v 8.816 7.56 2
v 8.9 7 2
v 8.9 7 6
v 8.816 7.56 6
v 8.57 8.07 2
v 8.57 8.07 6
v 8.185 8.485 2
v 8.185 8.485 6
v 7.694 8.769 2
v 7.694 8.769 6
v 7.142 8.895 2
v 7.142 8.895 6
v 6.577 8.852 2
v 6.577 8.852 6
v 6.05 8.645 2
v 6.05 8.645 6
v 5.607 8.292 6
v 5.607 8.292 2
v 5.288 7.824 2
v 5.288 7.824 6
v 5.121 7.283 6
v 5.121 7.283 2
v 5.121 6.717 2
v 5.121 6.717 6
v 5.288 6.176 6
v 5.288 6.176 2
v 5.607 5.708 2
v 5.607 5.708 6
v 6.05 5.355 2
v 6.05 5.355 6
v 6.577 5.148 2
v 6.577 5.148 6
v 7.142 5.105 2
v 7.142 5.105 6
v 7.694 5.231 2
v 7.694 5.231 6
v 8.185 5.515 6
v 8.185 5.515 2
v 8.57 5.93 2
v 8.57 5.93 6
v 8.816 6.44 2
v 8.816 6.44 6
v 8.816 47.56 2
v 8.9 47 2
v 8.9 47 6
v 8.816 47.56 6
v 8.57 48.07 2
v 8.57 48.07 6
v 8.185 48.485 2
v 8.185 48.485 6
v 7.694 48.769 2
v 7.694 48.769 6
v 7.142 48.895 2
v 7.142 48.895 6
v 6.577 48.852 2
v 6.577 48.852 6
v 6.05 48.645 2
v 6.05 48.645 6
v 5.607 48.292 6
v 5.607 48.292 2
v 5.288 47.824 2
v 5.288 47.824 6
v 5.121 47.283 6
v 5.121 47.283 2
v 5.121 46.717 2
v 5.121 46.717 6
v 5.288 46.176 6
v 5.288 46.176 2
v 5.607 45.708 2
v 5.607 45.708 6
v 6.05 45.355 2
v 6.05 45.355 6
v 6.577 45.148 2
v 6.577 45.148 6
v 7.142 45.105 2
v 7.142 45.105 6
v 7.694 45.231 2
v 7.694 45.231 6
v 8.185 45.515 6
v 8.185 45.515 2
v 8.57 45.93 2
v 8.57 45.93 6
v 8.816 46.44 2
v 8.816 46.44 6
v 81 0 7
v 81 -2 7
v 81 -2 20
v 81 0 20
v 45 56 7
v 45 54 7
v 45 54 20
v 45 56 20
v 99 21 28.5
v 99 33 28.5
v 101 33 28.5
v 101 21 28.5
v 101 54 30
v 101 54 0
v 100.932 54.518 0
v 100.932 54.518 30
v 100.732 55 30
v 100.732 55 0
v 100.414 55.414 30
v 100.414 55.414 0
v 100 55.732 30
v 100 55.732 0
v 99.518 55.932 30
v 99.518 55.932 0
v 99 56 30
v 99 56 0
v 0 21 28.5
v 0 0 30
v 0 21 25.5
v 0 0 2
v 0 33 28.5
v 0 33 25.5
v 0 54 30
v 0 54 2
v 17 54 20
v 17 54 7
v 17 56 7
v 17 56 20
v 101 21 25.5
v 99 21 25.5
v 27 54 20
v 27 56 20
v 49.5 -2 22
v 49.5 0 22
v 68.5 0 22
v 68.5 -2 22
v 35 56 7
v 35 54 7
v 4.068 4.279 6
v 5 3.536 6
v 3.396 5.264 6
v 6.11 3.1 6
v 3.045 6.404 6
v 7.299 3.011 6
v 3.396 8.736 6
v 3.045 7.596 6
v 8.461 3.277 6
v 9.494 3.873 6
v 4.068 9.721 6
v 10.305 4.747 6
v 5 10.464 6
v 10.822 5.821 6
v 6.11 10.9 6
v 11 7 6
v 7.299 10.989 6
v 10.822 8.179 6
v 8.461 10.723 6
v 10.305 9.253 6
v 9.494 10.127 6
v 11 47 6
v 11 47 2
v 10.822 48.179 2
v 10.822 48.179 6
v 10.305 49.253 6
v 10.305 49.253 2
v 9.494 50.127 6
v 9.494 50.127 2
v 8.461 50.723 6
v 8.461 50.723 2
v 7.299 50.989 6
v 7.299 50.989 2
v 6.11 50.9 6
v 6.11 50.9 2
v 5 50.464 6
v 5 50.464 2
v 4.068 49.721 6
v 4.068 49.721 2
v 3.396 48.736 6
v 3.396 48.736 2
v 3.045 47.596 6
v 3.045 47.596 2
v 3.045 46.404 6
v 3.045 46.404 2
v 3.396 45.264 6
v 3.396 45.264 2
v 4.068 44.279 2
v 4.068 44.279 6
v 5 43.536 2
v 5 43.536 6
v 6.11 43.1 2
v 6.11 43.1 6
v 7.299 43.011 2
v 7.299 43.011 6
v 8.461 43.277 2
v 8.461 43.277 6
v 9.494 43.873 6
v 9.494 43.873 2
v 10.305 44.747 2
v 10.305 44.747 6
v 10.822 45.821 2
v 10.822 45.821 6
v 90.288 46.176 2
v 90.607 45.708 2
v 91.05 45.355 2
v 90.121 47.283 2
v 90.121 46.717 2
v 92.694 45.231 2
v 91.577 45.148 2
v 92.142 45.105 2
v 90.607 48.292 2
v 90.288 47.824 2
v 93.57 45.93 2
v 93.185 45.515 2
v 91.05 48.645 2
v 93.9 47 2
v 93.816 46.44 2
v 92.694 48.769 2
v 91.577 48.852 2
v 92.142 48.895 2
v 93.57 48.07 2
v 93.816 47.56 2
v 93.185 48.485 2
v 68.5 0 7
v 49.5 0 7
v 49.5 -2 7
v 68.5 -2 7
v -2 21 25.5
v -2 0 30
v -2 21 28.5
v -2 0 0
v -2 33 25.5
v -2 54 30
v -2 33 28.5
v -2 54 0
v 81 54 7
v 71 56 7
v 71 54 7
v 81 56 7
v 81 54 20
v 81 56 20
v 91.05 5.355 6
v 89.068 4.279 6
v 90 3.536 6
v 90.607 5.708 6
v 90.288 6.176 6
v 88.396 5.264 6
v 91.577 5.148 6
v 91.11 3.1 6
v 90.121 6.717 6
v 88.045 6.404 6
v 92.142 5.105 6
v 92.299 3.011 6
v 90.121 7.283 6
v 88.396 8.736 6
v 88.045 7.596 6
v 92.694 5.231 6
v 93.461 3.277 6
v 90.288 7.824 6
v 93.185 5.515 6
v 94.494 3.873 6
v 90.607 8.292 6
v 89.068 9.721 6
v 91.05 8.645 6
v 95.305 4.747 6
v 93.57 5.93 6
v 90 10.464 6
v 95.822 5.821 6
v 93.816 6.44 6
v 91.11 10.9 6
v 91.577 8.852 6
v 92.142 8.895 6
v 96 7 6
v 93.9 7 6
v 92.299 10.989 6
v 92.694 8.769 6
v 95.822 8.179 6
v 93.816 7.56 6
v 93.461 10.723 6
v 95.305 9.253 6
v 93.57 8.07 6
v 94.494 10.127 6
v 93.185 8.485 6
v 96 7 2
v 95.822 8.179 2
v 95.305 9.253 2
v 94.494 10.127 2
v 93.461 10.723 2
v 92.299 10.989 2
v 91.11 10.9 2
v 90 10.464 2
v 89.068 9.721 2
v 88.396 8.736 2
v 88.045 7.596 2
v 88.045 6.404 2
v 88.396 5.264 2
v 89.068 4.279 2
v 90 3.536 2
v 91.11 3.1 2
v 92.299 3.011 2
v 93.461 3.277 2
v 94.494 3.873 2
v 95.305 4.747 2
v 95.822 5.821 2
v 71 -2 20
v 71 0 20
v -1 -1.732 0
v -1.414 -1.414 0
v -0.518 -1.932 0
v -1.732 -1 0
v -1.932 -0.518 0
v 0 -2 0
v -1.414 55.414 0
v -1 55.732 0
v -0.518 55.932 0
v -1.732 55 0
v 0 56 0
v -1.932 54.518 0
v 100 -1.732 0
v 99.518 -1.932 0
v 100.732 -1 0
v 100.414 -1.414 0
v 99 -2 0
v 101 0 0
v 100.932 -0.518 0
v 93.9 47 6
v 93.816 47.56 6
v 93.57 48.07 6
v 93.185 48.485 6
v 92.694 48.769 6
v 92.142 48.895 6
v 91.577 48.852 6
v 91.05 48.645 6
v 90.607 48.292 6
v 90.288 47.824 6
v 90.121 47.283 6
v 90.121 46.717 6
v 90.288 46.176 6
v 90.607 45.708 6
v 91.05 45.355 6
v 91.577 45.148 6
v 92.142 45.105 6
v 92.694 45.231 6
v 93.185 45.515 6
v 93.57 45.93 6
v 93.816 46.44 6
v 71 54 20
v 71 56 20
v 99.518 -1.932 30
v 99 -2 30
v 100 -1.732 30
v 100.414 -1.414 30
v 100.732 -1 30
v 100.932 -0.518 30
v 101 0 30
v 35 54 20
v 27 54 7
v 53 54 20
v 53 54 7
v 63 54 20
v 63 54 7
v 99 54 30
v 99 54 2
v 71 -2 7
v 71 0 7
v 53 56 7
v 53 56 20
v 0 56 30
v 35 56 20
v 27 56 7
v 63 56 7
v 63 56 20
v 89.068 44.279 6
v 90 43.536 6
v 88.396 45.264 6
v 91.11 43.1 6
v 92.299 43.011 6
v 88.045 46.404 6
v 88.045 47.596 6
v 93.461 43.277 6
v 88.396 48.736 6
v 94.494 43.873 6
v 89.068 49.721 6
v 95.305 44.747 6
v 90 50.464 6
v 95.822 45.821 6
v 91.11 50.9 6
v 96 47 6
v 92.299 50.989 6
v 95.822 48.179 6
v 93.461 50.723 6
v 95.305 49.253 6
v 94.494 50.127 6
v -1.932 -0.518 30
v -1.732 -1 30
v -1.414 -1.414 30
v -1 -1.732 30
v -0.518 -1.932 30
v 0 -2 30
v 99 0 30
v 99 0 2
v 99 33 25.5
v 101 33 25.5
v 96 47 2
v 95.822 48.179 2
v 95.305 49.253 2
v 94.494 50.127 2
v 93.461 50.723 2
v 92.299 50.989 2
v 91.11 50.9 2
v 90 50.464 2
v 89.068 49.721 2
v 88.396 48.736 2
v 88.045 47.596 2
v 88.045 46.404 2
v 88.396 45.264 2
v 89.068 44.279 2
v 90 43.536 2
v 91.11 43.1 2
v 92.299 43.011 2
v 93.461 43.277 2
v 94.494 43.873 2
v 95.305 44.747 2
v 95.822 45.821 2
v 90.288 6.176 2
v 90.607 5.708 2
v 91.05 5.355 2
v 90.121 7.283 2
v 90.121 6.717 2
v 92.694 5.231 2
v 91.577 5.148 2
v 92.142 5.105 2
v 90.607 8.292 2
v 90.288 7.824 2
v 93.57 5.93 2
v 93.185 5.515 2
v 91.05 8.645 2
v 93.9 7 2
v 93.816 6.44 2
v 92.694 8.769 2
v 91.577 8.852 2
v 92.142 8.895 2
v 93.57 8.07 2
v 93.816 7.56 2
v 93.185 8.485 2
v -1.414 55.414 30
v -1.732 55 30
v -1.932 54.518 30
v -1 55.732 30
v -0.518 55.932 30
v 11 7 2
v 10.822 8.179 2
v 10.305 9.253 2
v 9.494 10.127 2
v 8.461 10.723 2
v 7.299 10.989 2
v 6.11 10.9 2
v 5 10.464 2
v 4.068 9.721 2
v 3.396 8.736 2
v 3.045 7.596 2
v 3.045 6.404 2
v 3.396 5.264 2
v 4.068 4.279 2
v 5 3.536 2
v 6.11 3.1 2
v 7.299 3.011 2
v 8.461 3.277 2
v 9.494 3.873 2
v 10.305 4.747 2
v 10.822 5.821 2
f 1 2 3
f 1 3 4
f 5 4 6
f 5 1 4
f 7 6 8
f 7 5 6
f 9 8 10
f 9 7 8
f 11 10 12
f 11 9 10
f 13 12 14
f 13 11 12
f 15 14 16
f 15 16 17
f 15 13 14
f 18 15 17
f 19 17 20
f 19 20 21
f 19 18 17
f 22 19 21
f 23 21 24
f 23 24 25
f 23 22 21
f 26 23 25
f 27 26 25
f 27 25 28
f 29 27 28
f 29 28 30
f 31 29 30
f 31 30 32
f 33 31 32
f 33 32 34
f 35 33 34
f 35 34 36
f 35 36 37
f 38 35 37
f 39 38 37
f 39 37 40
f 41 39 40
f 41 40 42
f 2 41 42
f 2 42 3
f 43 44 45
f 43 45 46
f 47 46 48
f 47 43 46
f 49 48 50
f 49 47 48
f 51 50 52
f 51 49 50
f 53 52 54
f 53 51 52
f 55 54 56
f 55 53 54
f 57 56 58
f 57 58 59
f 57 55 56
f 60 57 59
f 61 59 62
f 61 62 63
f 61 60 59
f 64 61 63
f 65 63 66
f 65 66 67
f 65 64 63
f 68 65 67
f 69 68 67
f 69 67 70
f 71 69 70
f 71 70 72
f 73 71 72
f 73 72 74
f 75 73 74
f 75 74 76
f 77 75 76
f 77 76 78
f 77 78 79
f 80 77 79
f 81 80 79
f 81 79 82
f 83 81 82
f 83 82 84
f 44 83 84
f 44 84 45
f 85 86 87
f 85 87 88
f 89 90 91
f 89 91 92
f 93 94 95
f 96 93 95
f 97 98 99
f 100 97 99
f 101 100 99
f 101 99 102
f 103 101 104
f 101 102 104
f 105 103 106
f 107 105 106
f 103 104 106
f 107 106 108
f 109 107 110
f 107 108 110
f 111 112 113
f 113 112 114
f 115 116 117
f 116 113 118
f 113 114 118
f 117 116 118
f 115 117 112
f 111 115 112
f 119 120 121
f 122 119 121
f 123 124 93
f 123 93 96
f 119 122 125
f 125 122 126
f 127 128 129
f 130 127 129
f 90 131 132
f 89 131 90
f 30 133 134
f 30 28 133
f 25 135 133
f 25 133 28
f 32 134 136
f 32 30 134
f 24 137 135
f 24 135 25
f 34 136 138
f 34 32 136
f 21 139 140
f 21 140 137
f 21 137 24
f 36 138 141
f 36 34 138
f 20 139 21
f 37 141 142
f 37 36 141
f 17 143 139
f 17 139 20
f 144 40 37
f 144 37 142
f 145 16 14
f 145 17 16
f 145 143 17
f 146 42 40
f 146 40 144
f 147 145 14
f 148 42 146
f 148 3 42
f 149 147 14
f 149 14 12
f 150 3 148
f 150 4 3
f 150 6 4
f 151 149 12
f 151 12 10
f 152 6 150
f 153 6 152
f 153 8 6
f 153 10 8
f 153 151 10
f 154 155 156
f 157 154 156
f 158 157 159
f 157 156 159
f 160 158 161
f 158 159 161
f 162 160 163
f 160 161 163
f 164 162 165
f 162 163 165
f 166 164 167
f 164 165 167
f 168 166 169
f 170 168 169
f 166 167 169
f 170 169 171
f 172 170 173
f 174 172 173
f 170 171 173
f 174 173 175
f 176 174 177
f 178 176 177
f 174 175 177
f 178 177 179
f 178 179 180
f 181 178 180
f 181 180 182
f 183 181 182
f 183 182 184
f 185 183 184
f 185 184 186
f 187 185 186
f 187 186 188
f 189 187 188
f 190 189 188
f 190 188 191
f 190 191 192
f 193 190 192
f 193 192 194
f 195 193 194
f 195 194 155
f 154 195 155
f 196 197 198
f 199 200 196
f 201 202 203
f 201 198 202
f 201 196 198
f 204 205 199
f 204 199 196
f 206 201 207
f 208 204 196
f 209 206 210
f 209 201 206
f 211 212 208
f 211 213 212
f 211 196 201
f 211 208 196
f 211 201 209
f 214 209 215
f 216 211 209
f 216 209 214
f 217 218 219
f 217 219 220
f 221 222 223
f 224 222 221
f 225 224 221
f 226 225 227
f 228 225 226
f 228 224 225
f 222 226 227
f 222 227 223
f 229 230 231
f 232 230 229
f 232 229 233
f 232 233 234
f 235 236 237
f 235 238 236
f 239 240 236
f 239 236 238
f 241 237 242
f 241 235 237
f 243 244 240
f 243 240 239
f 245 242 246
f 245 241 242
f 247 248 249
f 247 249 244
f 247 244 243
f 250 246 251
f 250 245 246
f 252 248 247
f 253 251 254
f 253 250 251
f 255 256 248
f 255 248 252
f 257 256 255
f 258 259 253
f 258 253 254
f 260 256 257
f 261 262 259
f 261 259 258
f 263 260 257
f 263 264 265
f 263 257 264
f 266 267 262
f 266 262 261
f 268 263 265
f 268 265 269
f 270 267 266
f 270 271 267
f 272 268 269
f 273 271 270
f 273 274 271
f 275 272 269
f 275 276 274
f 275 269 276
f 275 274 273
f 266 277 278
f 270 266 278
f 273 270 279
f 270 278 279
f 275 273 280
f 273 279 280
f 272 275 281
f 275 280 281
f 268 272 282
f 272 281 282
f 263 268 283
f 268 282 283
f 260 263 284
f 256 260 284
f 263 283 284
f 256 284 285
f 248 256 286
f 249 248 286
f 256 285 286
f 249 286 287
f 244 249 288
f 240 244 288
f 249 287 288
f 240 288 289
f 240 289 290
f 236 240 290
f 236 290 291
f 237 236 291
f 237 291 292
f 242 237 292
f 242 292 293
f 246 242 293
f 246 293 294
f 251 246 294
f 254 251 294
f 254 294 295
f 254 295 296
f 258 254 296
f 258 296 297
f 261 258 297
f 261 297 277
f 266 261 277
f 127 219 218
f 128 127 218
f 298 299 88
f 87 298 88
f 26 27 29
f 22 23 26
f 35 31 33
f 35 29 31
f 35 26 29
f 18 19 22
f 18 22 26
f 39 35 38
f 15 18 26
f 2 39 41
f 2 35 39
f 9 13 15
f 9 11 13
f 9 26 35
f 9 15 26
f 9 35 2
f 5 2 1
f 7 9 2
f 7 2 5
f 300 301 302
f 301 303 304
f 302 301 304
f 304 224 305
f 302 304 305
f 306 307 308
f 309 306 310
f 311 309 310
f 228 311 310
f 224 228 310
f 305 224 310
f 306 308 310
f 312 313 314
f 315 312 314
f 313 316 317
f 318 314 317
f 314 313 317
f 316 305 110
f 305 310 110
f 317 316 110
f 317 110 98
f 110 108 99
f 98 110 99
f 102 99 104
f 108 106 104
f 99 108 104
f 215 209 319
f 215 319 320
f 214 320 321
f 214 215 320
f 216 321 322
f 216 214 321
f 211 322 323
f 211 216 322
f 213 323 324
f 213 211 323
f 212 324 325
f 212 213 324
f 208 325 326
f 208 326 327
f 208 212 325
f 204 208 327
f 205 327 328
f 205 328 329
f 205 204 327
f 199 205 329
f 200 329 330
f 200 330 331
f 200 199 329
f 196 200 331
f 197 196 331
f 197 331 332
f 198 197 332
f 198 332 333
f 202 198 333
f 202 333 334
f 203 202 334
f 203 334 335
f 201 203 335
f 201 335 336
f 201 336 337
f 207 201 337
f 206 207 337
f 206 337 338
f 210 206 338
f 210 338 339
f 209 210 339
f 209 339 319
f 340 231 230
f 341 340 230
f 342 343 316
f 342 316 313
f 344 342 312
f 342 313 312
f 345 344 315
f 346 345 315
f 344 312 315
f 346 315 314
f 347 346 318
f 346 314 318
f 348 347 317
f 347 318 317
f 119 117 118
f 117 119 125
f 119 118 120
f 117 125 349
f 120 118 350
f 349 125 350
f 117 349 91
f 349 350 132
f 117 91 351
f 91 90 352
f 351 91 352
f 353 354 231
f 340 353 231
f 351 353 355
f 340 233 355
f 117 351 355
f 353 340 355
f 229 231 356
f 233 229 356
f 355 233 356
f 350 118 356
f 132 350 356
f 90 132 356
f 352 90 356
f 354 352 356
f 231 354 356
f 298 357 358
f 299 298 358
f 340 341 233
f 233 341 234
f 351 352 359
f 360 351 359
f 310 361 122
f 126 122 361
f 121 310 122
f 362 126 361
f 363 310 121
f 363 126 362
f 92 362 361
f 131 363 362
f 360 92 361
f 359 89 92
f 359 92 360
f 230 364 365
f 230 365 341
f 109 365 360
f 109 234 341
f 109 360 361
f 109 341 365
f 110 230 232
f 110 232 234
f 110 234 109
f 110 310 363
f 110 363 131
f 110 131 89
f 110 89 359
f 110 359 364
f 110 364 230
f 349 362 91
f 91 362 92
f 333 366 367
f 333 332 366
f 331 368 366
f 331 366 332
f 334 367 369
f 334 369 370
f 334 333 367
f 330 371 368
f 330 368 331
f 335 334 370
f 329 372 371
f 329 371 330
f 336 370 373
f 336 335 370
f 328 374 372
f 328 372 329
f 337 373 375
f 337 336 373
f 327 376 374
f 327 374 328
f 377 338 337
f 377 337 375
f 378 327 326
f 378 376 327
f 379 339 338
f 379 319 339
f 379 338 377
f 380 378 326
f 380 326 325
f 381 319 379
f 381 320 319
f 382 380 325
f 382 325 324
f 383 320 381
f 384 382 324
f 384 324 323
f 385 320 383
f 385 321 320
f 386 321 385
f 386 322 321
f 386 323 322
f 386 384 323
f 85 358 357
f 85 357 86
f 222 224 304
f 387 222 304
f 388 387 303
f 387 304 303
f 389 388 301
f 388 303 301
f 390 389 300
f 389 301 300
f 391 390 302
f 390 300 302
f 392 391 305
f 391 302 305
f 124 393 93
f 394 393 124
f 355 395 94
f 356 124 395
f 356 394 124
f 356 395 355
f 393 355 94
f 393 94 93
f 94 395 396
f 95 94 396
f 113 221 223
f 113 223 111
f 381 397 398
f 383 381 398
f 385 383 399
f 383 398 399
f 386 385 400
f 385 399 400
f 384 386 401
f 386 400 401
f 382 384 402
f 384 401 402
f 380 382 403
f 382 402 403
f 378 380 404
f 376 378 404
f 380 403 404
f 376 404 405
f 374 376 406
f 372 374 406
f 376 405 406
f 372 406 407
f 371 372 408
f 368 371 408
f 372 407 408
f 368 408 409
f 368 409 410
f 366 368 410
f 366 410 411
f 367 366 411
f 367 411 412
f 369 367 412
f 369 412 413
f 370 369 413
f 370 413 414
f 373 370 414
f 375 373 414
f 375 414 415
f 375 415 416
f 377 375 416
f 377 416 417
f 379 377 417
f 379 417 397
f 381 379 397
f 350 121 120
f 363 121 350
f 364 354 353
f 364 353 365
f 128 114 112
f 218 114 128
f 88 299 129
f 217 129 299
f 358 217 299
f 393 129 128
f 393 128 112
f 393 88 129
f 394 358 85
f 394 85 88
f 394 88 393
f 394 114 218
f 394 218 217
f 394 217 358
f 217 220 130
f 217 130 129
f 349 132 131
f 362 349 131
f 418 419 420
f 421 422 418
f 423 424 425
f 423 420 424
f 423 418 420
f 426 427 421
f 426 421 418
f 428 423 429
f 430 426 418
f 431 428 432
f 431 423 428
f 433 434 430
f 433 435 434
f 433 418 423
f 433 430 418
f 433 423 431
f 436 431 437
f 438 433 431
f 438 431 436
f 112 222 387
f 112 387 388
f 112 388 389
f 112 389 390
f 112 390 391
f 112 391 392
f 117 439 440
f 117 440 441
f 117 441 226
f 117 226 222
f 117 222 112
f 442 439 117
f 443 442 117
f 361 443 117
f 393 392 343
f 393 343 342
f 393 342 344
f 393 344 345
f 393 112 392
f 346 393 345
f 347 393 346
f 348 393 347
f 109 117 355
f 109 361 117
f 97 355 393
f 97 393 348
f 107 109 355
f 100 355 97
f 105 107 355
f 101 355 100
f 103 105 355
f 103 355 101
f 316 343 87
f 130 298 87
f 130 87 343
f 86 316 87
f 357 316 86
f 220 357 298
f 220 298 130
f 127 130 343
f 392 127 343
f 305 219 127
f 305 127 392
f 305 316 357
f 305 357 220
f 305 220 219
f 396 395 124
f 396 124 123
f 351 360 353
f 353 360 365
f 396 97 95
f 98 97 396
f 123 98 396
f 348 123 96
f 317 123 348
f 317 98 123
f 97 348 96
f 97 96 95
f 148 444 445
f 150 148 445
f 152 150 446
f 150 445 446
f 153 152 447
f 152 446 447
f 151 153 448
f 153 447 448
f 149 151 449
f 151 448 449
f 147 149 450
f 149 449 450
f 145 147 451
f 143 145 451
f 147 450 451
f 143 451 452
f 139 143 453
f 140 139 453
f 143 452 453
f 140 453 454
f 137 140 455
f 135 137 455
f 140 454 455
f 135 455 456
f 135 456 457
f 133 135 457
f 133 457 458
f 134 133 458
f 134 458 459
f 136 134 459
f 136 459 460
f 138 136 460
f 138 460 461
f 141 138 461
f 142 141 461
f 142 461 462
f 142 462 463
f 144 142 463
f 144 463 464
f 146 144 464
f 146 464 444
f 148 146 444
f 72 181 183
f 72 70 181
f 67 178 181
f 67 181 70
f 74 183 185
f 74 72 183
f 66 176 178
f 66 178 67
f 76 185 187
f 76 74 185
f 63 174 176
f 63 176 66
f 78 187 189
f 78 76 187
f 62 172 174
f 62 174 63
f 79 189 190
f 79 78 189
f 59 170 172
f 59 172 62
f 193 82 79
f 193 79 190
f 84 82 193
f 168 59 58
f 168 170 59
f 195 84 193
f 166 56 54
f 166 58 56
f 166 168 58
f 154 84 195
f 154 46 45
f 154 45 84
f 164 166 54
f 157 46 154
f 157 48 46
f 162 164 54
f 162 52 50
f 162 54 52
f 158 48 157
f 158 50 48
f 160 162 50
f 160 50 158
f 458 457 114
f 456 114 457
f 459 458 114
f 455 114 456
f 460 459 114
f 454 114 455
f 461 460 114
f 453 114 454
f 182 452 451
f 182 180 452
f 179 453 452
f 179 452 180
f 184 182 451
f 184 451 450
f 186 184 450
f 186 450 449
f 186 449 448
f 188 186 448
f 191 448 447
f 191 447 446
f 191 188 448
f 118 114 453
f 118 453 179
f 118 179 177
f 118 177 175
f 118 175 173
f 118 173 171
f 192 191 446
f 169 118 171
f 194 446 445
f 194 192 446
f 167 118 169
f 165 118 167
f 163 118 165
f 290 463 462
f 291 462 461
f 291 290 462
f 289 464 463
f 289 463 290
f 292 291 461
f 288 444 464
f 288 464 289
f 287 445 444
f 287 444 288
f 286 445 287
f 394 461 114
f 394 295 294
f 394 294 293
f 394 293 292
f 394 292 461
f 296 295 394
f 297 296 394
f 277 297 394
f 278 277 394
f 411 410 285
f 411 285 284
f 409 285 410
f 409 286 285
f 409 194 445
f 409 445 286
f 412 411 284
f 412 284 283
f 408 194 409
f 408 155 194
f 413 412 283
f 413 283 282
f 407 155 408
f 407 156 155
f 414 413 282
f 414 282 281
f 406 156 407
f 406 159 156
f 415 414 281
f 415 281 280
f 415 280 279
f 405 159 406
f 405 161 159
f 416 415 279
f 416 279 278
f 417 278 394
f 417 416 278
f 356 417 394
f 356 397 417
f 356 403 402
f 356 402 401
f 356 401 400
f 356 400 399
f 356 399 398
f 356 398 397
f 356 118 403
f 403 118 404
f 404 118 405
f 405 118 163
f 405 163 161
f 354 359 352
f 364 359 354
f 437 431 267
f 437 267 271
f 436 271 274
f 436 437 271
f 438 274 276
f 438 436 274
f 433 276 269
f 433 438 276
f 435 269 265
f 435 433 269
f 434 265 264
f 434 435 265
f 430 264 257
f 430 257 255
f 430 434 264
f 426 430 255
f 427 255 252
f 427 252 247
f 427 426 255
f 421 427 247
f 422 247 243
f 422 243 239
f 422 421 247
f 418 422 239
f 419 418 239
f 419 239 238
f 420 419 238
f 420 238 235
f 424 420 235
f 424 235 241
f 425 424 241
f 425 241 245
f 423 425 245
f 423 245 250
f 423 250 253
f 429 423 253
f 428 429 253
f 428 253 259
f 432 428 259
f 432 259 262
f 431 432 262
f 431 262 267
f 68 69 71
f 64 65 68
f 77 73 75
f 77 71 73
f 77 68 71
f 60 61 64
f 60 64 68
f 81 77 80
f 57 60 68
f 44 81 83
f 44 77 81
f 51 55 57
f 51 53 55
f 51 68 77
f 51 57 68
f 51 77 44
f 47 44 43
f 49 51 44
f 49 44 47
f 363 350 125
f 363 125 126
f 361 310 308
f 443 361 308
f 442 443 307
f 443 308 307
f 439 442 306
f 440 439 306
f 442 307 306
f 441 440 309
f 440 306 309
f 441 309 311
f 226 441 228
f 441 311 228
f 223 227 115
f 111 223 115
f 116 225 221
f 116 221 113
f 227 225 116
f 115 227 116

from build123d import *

# Parameters (mm, degrees)
BOX002_W      = 10
BOX002_H      = 4
BOX002_DEPTH  = 13
BOX003_W      = 10
BOX003_H      = 4
BOX003_DEPTH  = 13
BOX004_W      = 10
BOX004_H      = 4
BOX004_DEPTH  = 13
BOX005_W      = 10
BOX005_H      = 4
BOX005_DEPTH  = 13
BOX006_W      = 19
BOX006_H      = 4
BOX006_DEPTH  = 15
BOX007_W      = 4
BOX007_H      = 12
BOX007_DEPTH  = 3
BOX008_W      = 4
BOX008_H      = 12
BOX008_DEPTH  = 3
BOX001_W      = 10
BOX001_H      = 4
BOX001_DEPTH  = 13
BOX_W         = 100
BOX_H         = 55
BOX_DEPTH     = 2
TUBE_R        = 4
TUBE_R_2      = 1.9
TUBE_DEPTH    = 6
TUBE001_R     = 4
TUBE001_R_2   = 1.9
TUBE001_DEPTH = 6
TUBE002_R     = 4
TUBE002_R_2   = 1.9
TUBE002_DEPTH = 6
TUBE003_R     = 4
TUBE003_R_2   = 1.9
TUBE003_DEPTH = 6
SKETCH_W      = 99
SKETCH_H      = 54
PAD_DEPTH     = 30


with BuildPart() as barrelcutout001:
    # Box002 → Box002 (new body)
    with BuildSketch(Plane(origin=(53, 52, 7), x_dir=(1, 0, 0), z_dir=(0, 0, 1))):
        with Locations((5, 2)):
            Rectangle(BOX002_W, BOX002_H)
    extrude(amount=BOX002_DEPTH)


with BuildPart() as barrelcutout002:
    # Box003 → Box003 (new body)
    with BuildSketch(Plane(origin=(35, 52, 7), x_dir=(1, 0, 0), z_dir=(0, 0, 1))):
        with Locations((5, 2)):
            Rectangle(BOX003_W, BOX003_H)
    extrude(amount=BOX003_DEPTH)


with BuildPart() as barrelcutout003:
    # Box004 → Box004 (new body)
    with BuildSketch(Plane(origin=(17, 52, 7), x_dir=(1, 0, 0), z_dir=(0, 0, 1))):
        with Locations((5, 2)):
            Rectangle(BOX004_W, BOX004_H)
    extrude(amount=BOX004_DEPTH)


with BuildPart() as barrelcutout004:
    # Box005 → Box005 (new body)
    with BuildSketch(Plane(origin=(71, -3, 7), x_dir=(1, 0, 0), z_dir=(0, 0, 1))):
        with Locations((5, 2)):
            Rectangle(BOX005_W, BOX005_H)
    extrude(amount=BOX005_DEPTH)


with BuildPart() as rj45cutout:
    # Box006 → Box006 (new body)
    with BuildSketch(Plane(origin=(49.5, -3, 7), x_dir=(1, 0, 0), z_dir=(0, 0, 1))):
        with Locations((9.5, 2)):
            Rectangle(BOX006_W, BOX006_H)
    extrude(amount=BOX006_DEPTH)


with BuildPart() as latchcut:
    # Box007 → Box007 (new body)
    with BuildSketch(Plane(origin=(-2.5, 21, 25.5), x_dir=(1, 0, 0), z_dir=(0, 0, 1))):
        with Locations((2, 6)):
            Rectangle(BOX007_W, BOX007_H)
    extrude(amount=BOX007_DEPTH)


with BuildPart() as latchcut001:
    # Box008 → Box008 (new body)
    with BuildSketch(Plane(origin=(97.5, 21, 25.5), x_dir=(1, 0, 0), z_dir=(0, 0, 1))):
        with Locations((2, 6)):
            Rectangle(BOX008_W, BOX008_H)
    extrude(amount=BOX008_DEPTH)


with BuildPart() as cuts:
    # Box001 → Box001 (new body)
    with BuildSketch(Plane(origin=(71, 52, 7), x_dir=(1, 0, 0), z_dir=(0, 0, 1))):
        with Locations((5, 2)):
            Rectangle(BOX001_W, BOX001_H)
    extrude(amount=BOX001_DEPTH)

    # Fusion001: union BarrelCutout001, BarrelCutout002, BarrelCutout003, BarrelCutout004, RJ45Cutout, LatchCut, LatchCut001
    add(barrelcutout001.part)
    add(barrelcutout002.part)
    add(barrelcutout003.part)
    add(barrelcutout004.part)
    add(rj45cutout.part)
    add(latchcut.part)
    add(latchcut001.part)


with BuildPart() as base:
    # Box → Box (new body)
    with BuildSketch(Plane(origin=(-0.5, -0.5, 0), x_dir=(1, 0, 0), z_dir=(0, 0, 1))):
        with Locations((50, 27.5)):
            Rectangle(BOX_W, BOX_H)
    extrude(amount=BOX_DEPTH)


with BuildPart() as standoff:
    # Tube → Tube (new body)
    with BuildSketch(Plane(origin=(7, 7, 0), x_dir=(1, 0, 0), z_dir=(0, 0, 1))):
        Circle(TUBE_R)
        Circle(TUBE_R_2, mode=Mode.SUBTRACT)
    extrude(amount=TUBE_DEPTH)


with BuildPart() as standoff001:
    # Tube001 → Tube001 (new body)
    with BuildSketch(Plane(origin=(92, 7, 0), x_dir=(1, 0, 0), z_dir=(0, 0, 1))):
        Circle(TUBE001_R)
        Circle(TUBE001_R_2, mode=Mode.SUBTRACT)
    extrude(amount=TUBE001_DEPTH)


with BuildPart() as standoff002:
    # Tube002 → Tube002 (new body)
    with BuildSketch(Plane(origin=(7, 47, 0), x_dir=(1, 0, 0), z_dir=(0, 0, 1))):
        Circle(TUBE002_R)
        Circle(TUBE002_R_2, mode=Mode.SUBTRACT)
    extrude(amount=TUBE002_DEPTH)


with BuildPart() as standoff003:
    # Tube003 → Tube003 (new body)
    with BuildSketch(Plane(origin=(92, 47, 0), x_dir=(1, 0, 0), z_dir=(0, 0, 1))):
        Circle(TUBE003_R)
        Circle(TUBE003_R_2, mode=Mode.SUBTRACT)
    extrude(amount=TUBE003_DEPTH)


with BuildPart() as casefull:
    # Sketch → Pad (new body)
    with BuildSketch(Plane.XY):
        with BuildLine():
            ThreePointArc((0, 56), (-1.414214, 55.414214), (-2, 54))
            Line((-2, 0), (-2, 54))
            ThreePointArc((-2, 0), (-1.414214, -1.414214), (0, -2))
            Line((99, -2), (0, -2))
            ThreePointArc((99, -2), (100.414214, -1.414214), (101, 0))
            Line((101, 54), (101, 0))
            ThreePointArc((101, 54), (100.414207, 55.41422), (98.999983, 56))
            Line((0, 56), (98.999983, 56))
        make_face()
        with Locations((49.5, 27)):
            Rectangle(SKETCH_W, SKETCH_H, mode=Mode.SUBTRACT)
    extrude(amount=PAD_DEPTH)

    # Fusion: union Base, Standoff, Standoff001, Standoff002, Standoff003
    add(base.part)
    add(standoff.part)
    add(standoff001.part)
    add(standoff002.part)
    add(standoff003.part)

    # Cut: cut Cuts
    add(cuts.part, mode=Mode.SUBTRACT)


solid = casefull.part
